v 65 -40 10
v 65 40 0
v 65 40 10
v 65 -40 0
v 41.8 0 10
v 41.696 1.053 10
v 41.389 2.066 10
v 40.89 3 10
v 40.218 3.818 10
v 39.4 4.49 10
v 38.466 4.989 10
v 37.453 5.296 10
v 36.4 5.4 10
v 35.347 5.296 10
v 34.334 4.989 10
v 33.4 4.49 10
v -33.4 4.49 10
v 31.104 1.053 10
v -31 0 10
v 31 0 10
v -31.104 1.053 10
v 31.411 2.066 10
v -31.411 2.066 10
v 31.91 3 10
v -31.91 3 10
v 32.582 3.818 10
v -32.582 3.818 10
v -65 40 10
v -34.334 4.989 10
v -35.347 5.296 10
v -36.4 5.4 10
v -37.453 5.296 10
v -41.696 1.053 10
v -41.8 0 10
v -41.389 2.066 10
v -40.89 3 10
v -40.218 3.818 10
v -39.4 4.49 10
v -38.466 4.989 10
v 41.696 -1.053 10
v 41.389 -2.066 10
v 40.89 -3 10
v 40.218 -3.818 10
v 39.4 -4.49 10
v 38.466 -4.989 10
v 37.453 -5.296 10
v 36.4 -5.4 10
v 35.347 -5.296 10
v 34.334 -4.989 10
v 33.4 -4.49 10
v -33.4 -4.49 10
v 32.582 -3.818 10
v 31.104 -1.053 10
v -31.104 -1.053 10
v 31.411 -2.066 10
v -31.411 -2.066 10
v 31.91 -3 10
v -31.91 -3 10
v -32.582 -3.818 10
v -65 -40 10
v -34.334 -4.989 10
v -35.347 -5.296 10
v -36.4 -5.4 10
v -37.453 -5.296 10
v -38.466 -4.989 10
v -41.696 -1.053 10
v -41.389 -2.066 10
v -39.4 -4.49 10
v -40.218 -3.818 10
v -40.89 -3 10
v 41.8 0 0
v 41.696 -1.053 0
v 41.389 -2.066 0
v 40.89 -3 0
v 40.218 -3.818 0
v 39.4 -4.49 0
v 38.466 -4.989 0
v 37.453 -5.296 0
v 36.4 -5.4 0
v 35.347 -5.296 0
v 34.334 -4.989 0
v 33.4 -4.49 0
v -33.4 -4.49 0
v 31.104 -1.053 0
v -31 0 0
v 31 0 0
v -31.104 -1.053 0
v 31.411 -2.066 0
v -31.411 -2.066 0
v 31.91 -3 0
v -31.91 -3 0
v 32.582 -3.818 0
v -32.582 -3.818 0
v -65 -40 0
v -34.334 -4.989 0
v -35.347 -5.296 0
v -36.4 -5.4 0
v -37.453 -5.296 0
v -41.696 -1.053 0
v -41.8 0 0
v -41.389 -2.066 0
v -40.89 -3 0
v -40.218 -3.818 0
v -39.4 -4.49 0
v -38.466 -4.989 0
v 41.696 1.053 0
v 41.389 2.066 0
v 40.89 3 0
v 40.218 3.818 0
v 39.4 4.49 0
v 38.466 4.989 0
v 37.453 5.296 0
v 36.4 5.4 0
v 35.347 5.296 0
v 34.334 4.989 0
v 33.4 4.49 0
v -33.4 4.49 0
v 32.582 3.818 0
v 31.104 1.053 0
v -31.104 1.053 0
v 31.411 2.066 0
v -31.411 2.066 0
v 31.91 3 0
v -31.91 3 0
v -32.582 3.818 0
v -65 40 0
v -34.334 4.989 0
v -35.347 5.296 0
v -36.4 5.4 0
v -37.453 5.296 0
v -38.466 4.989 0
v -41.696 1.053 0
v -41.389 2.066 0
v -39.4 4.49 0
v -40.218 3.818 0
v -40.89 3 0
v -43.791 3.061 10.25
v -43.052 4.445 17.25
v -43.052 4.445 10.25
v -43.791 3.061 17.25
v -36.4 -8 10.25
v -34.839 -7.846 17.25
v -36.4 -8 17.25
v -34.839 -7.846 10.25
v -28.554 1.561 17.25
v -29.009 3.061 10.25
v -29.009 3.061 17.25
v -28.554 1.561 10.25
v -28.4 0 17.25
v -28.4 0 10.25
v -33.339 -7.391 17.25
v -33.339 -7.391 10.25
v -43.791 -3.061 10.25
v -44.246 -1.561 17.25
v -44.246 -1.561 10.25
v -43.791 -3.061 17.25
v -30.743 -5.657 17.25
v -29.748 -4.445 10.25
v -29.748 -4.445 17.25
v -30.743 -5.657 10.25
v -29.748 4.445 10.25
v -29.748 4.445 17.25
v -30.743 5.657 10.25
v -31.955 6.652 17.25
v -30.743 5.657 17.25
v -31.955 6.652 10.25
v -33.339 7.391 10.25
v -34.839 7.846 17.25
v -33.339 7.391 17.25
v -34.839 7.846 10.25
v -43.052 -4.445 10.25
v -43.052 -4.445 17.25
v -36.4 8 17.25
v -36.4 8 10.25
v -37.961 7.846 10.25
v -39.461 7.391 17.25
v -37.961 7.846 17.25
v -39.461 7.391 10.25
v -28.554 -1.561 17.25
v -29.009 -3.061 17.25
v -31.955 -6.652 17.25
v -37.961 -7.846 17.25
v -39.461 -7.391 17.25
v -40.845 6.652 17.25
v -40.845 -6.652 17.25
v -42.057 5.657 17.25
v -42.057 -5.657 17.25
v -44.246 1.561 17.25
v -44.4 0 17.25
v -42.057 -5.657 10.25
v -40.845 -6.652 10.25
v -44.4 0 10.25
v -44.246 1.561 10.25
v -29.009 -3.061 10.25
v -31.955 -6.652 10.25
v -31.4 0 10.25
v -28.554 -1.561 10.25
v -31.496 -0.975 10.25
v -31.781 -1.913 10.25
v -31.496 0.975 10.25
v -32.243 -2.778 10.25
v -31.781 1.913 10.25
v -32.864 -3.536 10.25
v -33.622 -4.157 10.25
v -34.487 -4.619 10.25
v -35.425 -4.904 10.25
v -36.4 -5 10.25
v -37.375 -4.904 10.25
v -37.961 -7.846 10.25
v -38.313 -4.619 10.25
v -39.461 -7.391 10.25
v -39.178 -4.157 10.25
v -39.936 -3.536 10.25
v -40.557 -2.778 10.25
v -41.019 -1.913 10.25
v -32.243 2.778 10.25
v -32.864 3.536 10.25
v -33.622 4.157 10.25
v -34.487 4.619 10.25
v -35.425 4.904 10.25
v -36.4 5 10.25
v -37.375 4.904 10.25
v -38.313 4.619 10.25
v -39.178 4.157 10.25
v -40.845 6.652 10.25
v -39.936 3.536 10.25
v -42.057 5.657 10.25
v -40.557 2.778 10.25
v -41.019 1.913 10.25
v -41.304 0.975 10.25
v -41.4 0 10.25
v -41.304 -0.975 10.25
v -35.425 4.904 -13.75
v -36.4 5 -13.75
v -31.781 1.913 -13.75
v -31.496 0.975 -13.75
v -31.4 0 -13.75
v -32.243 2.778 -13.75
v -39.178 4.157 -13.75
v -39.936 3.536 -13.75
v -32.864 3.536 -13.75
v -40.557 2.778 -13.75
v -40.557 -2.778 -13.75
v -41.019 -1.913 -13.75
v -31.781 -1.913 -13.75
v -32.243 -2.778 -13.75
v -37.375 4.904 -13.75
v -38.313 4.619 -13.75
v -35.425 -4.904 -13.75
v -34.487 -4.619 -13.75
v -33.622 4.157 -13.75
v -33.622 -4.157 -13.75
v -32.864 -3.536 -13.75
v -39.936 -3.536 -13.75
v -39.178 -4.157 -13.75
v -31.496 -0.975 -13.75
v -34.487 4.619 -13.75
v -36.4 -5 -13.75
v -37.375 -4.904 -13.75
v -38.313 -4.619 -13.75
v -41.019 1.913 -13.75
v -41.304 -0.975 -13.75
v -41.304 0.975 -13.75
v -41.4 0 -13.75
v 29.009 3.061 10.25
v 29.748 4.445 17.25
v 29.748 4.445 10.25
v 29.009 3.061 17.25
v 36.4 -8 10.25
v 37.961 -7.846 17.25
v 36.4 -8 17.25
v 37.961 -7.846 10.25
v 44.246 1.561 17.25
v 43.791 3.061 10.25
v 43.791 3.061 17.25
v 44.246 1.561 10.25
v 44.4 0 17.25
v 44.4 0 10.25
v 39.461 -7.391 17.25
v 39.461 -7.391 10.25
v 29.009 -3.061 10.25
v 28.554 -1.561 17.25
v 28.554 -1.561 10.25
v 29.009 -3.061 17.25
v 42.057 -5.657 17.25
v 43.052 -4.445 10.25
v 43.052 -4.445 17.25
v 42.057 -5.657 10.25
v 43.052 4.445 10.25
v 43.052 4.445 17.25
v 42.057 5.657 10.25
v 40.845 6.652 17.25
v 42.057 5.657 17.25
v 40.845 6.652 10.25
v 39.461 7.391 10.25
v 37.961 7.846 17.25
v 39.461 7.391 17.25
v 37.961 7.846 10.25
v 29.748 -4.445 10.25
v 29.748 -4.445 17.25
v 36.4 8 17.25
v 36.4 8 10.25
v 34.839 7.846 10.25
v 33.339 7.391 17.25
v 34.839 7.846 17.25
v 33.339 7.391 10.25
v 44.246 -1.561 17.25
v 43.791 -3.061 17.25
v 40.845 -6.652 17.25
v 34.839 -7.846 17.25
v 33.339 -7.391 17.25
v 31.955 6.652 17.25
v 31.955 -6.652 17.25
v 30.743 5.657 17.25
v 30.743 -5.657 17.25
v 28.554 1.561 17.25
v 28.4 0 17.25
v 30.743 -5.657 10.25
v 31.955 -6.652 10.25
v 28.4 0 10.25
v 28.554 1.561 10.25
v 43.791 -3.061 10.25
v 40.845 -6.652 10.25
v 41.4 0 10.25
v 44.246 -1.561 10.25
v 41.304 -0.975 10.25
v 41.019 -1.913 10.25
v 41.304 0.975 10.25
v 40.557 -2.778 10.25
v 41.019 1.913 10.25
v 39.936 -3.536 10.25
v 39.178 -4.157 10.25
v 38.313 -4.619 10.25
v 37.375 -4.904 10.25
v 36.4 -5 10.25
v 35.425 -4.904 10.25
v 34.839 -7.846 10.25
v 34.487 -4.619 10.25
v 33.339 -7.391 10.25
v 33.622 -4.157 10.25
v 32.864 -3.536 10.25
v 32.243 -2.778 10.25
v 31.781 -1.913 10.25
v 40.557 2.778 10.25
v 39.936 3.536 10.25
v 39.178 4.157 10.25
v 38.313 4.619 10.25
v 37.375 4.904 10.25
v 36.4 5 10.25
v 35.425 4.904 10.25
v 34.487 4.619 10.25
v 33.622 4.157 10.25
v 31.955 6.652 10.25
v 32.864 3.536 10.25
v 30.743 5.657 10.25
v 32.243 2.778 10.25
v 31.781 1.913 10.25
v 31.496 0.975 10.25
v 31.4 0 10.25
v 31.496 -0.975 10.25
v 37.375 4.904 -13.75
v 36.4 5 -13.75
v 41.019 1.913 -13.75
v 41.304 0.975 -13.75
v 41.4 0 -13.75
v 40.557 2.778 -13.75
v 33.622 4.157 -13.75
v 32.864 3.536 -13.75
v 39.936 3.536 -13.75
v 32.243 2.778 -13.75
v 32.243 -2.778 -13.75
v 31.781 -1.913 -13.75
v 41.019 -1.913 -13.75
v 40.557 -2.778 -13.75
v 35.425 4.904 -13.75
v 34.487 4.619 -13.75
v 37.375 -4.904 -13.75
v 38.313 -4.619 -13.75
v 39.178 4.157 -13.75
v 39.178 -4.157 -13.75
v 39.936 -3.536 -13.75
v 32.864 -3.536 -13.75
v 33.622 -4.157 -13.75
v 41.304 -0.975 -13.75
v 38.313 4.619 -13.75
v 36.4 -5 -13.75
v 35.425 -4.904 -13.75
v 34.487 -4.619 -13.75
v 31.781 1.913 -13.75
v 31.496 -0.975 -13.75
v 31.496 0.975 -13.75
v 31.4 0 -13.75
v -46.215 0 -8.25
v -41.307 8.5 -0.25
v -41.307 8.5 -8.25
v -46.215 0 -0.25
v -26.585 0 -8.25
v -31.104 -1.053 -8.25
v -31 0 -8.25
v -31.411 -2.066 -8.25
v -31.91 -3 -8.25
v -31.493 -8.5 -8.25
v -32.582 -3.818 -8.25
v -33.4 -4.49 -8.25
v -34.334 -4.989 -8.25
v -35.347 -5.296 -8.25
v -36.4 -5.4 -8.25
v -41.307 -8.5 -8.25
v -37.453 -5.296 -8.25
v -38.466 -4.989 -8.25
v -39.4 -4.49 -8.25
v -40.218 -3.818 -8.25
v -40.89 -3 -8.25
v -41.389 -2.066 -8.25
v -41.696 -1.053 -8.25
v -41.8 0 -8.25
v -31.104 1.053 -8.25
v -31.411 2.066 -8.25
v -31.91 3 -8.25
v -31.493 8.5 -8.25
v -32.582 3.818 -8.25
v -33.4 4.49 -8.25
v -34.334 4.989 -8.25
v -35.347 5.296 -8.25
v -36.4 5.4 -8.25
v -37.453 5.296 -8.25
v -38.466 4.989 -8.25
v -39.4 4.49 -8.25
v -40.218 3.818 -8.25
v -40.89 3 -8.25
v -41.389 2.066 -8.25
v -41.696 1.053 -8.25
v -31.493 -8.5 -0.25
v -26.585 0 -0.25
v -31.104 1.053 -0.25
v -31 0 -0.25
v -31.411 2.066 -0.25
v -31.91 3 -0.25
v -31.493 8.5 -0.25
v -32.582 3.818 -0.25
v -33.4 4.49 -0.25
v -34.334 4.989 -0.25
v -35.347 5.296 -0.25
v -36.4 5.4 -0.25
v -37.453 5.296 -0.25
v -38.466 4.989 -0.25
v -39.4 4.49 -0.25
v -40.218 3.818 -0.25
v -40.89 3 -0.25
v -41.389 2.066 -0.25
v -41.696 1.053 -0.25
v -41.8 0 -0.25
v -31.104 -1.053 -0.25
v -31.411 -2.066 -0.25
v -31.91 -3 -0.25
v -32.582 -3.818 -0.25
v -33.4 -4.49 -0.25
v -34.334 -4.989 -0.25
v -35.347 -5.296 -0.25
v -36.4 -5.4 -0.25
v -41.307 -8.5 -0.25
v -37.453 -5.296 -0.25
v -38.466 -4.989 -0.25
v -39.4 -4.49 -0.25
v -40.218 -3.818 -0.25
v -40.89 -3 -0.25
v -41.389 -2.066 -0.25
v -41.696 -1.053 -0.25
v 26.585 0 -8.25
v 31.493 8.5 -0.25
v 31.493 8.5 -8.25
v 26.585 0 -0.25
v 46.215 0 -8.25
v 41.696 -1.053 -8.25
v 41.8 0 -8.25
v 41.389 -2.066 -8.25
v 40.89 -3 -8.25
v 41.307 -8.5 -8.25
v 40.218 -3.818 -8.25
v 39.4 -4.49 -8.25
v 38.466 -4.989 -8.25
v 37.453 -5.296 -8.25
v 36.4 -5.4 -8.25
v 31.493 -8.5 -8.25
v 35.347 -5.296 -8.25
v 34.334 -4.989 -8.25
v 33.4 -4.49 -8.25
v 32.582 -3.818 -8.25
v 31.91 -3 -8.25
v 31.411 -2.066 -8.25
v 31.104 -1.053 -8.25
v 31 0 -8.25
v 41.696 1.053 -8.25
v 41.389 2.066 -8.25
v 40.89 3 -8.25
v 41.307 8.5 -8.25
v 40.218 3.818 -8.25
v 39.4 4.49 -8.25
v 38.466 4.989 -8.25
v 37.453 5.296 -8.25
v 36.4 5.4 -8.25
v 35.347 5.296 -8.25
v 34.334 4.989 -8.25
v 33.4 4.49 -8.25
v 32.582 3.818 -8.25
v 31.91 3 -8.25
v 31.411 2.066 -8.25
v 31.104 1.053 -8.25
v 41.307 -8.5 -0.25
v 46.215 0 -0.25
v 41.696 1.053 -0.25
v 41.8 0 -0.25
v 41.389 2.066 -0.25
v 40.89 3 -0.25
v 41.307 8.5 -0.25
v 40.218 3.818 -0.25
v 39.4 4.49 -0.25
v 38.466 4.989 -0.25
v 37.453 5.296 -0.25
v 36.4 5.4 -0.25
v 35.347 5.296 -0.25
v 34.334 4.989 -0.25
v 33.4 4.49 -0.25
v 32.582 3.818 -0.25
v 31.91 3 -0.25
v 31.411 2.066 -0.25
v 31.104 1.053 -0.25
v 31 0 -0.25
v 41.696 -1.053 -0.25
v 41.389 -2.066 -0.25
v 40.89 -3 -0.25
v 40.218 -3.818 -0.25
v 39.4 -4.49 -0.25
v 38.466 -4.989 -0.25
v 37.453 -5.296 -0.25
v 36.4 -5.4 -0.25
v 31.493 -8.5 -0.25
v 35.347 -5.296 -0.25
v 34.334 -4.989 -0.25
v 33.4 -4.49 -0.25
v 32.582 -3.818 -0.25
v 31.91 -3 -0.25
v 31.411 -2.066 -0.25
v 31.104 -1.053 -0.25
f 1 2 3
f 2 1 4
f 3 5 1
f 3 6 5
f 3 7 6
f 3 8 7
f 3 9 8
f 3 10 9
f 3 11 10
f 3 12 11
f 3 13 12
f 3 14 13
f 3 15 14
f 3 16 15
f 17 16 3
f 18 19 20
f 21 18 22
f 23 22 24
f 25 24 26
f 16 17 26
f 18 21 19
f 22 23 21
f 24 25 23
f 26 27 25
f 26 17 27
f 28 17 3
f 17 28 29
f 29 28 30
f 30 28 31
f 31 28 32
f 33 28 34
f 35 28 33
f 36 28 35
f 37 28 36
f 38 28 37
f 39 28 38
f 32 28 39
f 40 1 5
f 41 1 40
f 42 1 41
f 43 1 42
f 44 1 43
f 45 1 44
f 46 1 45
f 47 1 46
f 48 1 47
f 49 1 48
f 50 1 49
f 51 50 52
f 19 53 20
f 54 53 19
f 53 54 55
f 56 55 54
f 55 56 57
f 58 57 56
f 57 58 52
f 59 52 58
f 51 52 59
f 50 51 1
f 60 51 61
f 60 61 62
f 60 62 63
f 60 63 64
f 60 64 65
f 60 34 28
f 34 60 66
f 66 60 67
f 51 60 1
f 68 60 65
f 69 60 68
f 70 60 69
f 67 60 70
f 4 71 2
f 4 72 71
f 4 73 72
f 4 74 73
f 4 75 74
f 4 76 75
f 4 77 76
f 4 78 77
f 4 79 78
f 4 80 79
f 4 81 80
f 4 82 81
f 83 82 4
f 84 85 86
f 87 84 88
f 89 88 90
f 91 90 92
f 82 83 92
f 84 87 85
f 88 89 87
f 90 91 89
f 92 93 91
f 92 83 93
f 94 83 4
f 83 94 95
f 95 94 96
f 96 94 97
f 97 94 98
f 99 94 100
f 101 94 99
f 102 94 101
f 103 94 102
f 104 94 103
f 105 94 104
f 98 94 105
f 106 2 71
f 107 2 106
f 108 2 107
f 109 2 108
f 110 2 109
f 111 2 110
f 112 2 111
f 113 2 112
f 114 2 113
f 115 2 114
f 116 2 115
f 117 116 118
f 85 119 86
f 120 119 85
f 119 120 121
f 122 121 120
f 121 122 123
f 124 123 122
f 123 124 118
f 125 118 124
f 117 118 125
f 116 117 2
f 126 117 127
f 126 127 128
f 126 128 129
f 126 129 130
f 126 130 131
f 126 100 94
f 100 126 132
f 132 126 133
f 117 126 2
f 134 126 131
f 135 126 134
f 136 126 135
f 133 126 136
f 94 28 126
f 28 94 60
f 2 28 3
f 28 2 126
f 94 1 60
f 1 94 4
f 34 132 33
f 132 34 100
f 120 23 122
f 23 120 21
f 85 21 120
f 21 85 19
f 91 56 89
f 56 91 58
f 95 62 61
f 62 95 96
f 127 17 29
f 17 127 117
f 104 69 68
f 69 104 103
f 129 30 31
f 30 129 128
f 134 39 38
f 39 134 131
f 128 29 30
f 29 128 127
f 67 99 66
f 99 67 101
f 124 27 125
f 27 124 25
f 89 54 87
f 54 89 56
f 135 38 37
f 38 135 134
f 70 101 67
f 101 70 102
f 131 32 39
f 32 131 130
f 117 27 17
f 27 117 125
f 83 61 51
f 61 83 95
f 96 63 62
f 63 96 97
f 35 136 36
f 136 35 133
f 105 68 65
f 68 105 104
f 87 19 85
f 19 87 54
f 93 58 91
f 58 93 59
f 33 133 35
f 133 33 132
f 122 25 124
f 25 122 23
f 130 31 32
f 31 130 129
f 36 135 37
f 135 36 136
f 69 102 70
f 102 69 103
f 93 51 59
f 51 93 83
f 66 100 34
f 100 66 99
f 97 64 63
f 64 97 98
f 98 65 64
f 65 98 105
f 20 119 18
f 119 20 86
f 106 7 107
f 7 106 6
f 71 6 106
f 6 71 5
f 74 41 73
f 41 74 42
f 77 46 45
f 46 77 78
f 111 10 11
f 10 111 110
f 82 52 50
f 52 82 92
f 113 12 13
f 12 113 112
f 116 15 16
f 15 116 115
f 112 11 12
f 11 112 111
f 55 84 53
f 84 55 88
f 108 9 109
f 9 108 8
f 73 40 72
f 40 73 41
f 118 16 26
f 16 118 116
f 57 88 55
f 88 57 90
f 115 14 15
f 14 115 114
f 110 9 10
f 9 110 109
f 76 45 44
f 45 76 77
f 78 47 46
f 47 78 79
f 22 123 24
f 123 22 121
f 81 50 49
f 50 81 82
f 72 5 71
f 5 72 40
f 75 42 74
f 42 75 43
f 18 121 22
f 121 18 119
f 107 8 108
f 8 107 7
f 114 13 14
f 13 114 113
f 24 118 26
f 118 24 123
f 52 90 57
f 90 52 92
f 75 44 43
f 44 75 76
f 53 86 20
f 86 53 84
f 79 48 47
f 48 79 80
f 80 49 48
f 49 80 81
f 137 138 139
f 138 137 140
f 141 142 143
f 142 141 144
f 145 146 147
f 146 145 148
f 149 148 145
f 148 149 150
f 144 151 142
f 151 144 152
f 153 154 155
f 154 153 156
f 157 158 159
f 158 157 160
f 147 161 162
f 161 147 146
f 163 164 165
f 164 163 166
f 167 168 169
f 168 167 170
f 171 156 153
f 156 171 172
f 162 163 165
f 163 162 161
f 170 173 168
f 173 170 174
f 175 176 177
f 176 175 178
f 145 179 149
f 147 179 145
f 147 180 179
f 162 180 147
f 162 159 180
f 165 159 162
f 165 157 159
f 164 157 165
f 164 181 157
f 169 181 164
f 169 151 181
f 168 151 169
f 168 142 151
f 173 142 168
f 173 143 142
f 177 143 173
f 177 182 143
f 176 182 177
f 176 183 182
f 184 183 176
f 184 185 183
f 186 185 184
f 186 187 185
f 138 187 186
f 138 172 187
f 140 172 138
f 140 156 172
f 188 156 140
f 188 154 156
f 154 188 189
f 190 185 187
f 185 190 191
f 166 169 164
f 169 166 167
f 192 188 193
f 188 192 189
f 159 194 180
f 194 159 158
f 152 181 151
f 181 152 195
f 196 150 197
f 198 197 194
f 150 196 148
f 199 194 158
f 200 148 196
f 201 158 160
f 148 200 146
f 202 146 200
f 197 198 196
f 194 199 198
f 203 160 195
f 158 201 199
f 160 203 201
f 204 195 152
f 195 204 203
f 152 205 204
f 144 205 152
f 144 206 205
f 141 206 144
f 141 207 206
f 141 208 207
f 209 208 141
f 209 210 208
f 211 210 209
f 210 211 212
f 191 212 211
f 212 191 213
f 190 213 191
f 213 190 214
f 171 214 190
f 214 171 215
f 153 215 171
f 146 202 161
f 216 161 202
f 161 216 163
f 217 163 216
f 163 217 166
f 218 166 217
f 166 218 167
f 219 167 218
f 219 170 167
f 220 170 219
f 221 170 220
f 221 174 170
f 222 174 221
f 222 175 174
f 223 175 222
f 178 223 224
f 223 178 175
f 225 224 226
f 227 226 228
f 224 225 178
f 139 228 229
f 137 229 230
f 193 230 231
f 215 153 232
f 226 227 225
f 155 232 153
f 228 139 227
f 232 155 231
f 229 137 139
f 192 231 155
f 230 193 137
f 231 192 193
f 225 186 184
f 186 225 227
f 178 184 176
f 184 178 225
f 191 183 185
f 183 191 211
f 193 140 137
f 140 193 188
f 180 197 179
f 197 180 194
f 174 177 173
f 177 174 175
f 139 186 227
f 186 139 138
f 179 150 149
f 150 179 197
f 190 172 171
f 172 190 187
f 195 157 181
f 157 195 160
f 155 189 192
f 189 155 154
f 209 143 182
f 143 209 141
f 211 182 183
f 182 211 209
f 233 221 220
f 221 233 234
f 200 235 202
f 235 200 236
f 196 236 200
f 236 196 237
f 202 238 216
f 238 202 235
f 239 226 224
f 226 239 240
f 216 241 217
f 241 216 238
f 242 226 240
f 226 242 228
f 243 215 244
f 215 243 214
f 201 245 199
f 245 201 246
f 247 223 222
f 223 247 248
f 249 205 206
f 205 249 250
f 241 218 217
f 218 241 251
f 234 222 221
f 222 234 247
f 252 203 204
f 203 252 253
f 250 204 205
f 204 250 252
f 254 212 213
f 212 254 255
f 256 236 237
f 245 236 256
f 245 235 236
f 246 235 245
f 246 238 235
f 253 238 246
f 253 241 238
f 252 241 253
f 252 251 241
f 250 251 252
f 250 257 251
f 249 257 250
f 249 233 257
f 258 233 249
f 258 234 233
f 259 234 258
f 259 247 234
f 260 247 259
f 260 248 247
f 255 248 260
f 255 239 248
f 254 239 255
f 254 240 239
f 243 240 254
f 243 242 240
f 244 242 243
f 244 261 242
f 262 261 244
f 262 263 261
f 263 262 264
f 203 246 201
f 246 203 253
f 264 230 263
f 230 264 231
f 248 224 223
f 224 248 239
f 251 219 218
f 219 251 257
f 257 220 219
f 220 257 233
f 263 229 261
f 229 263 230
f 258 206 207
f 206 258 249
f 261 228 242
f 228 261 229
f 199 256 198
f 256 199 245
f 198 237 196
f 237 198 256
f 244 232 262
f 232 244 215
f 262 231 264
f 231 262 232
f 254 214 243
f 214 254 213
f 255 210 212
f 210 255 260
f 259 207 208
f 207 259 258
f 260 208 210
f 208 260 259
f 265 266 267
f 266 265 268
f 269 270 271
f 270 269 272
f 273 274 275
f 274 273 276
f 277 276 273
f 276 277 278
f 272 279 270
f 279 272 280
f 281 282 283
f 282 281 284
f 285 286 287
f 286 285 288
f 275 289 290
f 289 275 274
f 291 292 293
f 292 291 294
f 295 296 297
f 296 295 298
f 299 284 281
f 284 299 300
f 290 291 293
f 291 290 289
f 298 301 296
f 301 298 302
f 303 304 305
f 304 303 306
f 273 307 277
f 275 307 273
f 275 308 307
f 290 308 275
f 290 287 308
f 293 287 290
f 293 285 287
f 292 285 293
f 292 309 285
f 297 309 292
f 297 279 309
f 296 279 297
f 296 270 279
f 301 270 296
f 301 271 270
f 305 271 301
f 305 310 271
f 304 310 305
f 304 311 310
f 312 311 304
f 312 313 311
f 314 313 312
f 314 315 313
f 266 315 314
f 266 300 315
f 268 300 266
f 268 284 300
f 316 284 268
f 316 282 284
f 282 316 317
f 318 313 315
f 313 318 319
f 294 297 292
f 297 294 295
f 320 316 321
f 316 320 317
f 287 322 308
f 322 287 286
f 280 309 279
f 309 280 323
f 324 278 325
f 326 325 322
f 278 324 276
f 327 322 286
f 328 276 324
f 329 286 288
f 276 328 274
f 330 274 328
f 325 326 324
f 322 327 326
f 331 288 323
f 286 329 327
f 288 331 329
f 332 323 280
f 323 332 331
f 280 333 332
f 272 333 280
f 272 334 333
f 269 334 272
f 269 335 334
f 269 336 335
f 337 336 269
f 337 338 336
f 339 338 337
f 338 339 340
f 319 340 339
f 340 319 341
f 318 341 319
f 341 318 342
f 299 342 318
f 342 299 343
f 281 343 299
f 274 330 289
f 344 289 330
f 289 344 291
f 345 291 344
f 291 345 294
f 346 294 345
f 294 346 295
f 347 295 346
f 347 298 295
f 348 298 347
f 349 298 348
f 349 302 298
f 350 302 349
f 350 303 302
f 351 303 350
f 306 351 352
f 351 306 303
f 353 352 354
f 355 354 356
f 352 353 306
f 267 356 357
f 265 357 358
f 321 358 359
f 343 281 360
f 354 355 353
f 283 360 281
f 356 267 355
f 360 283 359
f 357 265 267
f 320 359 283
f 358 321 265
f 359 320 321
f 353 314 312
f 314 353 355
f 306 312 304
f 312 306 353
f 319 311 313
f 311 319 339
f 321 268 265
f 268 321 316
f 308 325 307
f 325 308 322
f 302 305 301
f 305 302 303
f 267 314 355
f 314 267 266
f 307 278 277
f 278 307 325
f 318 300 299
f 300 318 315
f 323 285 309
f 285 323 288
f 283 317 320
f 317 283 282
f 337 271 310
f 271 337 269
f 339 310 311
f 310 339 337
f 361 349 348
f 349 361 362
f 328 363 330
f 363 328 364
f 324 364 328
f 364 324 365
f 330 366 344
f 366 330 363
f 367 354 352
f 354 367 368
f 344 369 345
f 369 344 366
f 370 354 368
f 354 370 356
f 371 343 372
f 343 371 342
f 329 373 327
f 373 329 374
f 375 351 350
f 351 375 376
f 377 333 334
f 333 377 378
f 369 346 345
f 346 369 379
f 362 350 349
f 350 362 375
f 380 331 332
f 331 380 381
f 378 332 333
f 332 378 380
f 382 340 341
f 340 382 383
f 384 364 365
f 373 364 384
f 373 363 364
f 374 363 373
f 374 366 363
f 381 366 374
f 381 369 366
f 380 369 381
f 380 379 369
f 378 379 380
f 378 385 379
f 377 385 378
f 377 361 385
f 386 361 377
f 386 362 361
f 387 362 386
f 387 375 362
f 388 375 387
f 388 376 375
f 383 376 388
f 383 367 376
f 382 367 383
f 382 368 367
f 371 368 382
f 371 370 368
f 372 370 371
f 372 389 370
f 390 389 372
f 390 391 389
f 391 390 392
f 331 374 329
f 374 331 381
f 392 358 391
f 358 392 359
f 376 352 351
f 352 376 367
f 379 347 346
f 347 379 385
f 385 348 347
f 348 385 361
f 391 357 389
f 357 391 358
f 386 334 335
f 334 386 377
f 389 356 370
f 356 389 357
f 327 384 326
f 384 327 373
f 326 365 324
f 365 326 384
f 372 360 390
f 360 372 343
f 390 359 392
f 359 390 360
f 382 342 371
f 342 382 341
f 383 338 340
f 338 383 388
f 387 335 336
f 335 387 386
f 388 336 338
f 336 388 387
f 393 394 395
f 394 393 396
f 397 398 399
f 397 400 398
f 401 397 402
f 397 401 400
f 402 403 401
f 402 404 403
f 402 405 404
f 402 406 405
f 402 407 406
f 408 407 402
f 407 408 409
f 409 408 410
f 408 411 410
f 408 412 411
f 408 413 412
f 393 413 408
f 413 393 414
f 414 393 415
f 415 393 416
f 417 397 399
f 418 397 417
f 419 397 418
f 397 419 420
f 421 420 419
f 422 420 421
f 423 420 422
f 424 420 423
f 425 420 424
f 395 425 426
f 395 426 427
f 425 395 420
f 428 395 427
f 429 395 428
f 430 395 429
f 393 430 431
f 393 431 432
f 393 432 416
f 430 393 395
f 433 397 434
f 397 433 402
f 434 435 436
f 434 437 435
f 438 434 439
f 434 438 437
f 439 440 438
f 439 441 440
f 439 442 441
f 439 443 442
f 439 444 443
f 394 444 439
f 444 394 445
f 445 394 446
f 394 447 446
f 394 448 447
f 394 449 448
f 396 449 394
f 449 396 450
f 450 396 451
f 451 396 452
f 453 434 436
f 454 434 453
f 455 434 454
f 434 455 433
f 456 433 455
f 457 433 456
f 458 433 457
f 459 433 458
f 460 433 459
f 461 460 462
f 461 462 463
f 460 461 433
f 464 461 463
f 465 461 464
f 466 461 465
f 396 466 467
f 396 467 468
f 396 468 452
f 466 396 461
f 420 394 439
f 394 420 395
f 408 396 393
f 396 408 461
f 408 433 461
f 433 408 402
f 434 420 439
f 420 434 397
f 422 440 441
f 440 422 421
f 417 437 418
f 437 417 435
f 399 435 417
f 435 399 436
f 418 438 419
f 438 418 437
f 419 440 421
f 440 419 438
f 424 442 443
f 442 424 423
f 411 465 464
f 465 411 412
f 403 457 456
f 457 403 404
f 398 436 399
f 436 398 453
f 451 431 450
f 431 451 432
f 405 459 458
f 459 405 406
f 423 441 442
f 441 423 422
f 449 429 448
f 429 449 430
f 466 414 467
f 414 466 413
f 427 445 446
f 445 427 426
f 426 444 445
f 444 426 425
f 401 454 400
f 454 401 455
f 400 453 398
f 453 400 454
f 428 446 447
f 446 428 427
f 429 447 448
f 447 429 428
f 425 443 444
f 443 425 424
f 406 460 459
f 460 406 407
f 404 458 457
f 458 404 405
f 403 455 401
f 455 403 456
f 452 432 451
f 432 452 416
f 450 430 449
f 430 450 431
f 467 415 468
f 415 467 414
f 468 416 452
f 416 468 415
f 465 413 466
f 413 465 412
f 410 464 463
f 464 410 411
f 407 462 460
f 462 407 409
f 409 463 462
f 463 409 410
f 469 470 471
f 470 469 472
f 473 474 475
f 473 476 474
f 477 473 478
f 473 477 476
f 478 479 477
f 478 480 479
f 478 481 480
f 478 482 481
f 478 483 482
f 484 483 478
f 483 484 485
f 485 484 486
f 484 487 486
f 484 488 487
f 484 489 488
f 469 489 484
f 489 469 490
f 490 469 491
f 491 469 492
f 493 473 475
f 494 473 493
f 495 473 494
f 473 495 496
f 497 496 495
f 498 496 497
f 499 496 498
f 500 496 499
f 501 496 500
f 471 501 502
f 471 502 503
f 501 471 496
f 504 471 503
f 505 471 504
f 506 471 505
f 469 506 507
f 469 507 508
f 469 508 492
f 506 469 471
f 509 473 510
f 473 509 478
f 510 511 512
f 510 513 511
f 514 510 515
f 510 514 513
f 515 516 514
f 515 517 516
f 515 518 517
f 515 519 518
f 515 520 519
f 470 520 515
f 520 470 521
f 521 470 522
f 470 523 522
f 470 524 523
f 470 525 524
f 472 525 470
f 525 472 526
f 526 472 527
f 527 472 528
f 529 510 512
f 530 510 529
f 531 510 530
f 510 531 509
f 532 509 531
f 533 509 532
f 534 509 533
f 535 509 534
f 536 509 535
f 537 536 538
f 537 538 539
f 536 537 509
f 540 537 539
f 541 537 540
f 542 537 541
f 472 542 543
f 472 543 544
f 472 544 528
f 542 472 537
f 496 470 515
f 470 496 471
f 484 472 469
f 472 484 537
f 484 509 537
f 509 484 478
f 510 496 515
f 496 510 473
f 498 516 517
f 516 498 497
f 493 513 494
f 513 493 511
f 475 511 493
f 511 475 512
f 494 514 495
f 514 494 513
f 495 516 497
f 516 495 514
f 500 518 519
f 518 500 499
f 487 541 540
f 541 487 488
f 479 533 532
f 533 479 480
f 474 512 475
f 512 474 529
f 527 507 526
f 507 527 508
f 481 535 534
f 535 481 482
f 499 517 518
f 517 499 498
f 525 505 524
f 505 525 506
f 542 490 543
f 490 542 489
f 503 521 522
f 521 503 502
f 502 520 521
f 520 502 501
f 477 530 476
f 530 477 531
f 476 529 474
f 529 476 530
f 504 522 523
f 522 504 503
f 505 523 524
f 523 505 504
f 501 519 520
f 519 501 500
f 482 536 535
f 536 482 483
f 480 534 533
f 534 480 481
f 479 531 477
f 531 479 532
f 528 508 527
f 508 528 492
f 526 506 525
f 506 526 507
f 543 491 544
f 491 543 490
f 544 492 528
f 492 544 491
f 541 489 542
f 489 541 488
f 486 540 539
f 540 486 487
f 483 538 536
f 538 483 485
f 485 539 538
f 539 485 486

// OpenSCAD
$fn = 32;

// ------------------------------------------------------------------------
// Bolted plate: 130 x 80 x 10 mm plate, 2 fasteners
// Every part is its own module, assembly() places them once.
// ------------------------------------------------------------------------

// --- part 1 ---
module plate() {
  difference() {
    translate([-65, -40, 0]) cube([130, 80, 10]);
    translate([-36.4, 0, -1]) cylinder(h = 12, d = 10.8);
    translate([36.4, 0, -1]) cylinder(h = 12, d = 10.8);
  }
}

// --- part 2 ---
module bolt1() {
  cylinder(h = 7, d = 16);
  translate([0, 0, -24]) cylinder(h = 24, d = 10);
}

// --- part 3 ---
module bolt2() {
  cylinder(h = 7, d = 16);
  translate([0, 0, -24]) cylinder(h = 24, d = 10);
}

// --- part 4 ---
module nut1() {
  difference() {
    linear_extrude(height = 8) polygon(points = [[9.815, 0], [4.907, 8.5], [-4.907, 8.5], [-9.815, 0], [-4.907, -8.5], [4.907, -8.5]]);
    translate([0, 0, -1]) cylinder(h = 10, d = 10.8);
  }
}

// --- part 5 ---
module nut2() {
  difference() {
    linear_extrude(height = 8) polygon(points = [[9.815, 0], [4.907, 8.5], [-4.907, 8.5], [-9.815, 0], [-4.907, -8.5], [4.907, -8.5]]);
    translate([0, 0, -1]) cylinder(h = 10, d = 10.8);
  }
}

// --- assembly ---
module assembly() {
  translate([0, 0, 0]) rotate([0, 0, 0]) plate();
  translate([-36.4, 0, 10.25]) rotate([0, 0, 0]) bolt1();
  translate([36.4, 0, 10.25]) rotate([0, 0, 0]) bolt2();
  translate([-36.4, 0, -8.25]) rotate([0, 0, 0]) nut1();
  translate([36.4, 0, -8.25]) rotate([0, 0, 0]) nut2();
}

assembly();
